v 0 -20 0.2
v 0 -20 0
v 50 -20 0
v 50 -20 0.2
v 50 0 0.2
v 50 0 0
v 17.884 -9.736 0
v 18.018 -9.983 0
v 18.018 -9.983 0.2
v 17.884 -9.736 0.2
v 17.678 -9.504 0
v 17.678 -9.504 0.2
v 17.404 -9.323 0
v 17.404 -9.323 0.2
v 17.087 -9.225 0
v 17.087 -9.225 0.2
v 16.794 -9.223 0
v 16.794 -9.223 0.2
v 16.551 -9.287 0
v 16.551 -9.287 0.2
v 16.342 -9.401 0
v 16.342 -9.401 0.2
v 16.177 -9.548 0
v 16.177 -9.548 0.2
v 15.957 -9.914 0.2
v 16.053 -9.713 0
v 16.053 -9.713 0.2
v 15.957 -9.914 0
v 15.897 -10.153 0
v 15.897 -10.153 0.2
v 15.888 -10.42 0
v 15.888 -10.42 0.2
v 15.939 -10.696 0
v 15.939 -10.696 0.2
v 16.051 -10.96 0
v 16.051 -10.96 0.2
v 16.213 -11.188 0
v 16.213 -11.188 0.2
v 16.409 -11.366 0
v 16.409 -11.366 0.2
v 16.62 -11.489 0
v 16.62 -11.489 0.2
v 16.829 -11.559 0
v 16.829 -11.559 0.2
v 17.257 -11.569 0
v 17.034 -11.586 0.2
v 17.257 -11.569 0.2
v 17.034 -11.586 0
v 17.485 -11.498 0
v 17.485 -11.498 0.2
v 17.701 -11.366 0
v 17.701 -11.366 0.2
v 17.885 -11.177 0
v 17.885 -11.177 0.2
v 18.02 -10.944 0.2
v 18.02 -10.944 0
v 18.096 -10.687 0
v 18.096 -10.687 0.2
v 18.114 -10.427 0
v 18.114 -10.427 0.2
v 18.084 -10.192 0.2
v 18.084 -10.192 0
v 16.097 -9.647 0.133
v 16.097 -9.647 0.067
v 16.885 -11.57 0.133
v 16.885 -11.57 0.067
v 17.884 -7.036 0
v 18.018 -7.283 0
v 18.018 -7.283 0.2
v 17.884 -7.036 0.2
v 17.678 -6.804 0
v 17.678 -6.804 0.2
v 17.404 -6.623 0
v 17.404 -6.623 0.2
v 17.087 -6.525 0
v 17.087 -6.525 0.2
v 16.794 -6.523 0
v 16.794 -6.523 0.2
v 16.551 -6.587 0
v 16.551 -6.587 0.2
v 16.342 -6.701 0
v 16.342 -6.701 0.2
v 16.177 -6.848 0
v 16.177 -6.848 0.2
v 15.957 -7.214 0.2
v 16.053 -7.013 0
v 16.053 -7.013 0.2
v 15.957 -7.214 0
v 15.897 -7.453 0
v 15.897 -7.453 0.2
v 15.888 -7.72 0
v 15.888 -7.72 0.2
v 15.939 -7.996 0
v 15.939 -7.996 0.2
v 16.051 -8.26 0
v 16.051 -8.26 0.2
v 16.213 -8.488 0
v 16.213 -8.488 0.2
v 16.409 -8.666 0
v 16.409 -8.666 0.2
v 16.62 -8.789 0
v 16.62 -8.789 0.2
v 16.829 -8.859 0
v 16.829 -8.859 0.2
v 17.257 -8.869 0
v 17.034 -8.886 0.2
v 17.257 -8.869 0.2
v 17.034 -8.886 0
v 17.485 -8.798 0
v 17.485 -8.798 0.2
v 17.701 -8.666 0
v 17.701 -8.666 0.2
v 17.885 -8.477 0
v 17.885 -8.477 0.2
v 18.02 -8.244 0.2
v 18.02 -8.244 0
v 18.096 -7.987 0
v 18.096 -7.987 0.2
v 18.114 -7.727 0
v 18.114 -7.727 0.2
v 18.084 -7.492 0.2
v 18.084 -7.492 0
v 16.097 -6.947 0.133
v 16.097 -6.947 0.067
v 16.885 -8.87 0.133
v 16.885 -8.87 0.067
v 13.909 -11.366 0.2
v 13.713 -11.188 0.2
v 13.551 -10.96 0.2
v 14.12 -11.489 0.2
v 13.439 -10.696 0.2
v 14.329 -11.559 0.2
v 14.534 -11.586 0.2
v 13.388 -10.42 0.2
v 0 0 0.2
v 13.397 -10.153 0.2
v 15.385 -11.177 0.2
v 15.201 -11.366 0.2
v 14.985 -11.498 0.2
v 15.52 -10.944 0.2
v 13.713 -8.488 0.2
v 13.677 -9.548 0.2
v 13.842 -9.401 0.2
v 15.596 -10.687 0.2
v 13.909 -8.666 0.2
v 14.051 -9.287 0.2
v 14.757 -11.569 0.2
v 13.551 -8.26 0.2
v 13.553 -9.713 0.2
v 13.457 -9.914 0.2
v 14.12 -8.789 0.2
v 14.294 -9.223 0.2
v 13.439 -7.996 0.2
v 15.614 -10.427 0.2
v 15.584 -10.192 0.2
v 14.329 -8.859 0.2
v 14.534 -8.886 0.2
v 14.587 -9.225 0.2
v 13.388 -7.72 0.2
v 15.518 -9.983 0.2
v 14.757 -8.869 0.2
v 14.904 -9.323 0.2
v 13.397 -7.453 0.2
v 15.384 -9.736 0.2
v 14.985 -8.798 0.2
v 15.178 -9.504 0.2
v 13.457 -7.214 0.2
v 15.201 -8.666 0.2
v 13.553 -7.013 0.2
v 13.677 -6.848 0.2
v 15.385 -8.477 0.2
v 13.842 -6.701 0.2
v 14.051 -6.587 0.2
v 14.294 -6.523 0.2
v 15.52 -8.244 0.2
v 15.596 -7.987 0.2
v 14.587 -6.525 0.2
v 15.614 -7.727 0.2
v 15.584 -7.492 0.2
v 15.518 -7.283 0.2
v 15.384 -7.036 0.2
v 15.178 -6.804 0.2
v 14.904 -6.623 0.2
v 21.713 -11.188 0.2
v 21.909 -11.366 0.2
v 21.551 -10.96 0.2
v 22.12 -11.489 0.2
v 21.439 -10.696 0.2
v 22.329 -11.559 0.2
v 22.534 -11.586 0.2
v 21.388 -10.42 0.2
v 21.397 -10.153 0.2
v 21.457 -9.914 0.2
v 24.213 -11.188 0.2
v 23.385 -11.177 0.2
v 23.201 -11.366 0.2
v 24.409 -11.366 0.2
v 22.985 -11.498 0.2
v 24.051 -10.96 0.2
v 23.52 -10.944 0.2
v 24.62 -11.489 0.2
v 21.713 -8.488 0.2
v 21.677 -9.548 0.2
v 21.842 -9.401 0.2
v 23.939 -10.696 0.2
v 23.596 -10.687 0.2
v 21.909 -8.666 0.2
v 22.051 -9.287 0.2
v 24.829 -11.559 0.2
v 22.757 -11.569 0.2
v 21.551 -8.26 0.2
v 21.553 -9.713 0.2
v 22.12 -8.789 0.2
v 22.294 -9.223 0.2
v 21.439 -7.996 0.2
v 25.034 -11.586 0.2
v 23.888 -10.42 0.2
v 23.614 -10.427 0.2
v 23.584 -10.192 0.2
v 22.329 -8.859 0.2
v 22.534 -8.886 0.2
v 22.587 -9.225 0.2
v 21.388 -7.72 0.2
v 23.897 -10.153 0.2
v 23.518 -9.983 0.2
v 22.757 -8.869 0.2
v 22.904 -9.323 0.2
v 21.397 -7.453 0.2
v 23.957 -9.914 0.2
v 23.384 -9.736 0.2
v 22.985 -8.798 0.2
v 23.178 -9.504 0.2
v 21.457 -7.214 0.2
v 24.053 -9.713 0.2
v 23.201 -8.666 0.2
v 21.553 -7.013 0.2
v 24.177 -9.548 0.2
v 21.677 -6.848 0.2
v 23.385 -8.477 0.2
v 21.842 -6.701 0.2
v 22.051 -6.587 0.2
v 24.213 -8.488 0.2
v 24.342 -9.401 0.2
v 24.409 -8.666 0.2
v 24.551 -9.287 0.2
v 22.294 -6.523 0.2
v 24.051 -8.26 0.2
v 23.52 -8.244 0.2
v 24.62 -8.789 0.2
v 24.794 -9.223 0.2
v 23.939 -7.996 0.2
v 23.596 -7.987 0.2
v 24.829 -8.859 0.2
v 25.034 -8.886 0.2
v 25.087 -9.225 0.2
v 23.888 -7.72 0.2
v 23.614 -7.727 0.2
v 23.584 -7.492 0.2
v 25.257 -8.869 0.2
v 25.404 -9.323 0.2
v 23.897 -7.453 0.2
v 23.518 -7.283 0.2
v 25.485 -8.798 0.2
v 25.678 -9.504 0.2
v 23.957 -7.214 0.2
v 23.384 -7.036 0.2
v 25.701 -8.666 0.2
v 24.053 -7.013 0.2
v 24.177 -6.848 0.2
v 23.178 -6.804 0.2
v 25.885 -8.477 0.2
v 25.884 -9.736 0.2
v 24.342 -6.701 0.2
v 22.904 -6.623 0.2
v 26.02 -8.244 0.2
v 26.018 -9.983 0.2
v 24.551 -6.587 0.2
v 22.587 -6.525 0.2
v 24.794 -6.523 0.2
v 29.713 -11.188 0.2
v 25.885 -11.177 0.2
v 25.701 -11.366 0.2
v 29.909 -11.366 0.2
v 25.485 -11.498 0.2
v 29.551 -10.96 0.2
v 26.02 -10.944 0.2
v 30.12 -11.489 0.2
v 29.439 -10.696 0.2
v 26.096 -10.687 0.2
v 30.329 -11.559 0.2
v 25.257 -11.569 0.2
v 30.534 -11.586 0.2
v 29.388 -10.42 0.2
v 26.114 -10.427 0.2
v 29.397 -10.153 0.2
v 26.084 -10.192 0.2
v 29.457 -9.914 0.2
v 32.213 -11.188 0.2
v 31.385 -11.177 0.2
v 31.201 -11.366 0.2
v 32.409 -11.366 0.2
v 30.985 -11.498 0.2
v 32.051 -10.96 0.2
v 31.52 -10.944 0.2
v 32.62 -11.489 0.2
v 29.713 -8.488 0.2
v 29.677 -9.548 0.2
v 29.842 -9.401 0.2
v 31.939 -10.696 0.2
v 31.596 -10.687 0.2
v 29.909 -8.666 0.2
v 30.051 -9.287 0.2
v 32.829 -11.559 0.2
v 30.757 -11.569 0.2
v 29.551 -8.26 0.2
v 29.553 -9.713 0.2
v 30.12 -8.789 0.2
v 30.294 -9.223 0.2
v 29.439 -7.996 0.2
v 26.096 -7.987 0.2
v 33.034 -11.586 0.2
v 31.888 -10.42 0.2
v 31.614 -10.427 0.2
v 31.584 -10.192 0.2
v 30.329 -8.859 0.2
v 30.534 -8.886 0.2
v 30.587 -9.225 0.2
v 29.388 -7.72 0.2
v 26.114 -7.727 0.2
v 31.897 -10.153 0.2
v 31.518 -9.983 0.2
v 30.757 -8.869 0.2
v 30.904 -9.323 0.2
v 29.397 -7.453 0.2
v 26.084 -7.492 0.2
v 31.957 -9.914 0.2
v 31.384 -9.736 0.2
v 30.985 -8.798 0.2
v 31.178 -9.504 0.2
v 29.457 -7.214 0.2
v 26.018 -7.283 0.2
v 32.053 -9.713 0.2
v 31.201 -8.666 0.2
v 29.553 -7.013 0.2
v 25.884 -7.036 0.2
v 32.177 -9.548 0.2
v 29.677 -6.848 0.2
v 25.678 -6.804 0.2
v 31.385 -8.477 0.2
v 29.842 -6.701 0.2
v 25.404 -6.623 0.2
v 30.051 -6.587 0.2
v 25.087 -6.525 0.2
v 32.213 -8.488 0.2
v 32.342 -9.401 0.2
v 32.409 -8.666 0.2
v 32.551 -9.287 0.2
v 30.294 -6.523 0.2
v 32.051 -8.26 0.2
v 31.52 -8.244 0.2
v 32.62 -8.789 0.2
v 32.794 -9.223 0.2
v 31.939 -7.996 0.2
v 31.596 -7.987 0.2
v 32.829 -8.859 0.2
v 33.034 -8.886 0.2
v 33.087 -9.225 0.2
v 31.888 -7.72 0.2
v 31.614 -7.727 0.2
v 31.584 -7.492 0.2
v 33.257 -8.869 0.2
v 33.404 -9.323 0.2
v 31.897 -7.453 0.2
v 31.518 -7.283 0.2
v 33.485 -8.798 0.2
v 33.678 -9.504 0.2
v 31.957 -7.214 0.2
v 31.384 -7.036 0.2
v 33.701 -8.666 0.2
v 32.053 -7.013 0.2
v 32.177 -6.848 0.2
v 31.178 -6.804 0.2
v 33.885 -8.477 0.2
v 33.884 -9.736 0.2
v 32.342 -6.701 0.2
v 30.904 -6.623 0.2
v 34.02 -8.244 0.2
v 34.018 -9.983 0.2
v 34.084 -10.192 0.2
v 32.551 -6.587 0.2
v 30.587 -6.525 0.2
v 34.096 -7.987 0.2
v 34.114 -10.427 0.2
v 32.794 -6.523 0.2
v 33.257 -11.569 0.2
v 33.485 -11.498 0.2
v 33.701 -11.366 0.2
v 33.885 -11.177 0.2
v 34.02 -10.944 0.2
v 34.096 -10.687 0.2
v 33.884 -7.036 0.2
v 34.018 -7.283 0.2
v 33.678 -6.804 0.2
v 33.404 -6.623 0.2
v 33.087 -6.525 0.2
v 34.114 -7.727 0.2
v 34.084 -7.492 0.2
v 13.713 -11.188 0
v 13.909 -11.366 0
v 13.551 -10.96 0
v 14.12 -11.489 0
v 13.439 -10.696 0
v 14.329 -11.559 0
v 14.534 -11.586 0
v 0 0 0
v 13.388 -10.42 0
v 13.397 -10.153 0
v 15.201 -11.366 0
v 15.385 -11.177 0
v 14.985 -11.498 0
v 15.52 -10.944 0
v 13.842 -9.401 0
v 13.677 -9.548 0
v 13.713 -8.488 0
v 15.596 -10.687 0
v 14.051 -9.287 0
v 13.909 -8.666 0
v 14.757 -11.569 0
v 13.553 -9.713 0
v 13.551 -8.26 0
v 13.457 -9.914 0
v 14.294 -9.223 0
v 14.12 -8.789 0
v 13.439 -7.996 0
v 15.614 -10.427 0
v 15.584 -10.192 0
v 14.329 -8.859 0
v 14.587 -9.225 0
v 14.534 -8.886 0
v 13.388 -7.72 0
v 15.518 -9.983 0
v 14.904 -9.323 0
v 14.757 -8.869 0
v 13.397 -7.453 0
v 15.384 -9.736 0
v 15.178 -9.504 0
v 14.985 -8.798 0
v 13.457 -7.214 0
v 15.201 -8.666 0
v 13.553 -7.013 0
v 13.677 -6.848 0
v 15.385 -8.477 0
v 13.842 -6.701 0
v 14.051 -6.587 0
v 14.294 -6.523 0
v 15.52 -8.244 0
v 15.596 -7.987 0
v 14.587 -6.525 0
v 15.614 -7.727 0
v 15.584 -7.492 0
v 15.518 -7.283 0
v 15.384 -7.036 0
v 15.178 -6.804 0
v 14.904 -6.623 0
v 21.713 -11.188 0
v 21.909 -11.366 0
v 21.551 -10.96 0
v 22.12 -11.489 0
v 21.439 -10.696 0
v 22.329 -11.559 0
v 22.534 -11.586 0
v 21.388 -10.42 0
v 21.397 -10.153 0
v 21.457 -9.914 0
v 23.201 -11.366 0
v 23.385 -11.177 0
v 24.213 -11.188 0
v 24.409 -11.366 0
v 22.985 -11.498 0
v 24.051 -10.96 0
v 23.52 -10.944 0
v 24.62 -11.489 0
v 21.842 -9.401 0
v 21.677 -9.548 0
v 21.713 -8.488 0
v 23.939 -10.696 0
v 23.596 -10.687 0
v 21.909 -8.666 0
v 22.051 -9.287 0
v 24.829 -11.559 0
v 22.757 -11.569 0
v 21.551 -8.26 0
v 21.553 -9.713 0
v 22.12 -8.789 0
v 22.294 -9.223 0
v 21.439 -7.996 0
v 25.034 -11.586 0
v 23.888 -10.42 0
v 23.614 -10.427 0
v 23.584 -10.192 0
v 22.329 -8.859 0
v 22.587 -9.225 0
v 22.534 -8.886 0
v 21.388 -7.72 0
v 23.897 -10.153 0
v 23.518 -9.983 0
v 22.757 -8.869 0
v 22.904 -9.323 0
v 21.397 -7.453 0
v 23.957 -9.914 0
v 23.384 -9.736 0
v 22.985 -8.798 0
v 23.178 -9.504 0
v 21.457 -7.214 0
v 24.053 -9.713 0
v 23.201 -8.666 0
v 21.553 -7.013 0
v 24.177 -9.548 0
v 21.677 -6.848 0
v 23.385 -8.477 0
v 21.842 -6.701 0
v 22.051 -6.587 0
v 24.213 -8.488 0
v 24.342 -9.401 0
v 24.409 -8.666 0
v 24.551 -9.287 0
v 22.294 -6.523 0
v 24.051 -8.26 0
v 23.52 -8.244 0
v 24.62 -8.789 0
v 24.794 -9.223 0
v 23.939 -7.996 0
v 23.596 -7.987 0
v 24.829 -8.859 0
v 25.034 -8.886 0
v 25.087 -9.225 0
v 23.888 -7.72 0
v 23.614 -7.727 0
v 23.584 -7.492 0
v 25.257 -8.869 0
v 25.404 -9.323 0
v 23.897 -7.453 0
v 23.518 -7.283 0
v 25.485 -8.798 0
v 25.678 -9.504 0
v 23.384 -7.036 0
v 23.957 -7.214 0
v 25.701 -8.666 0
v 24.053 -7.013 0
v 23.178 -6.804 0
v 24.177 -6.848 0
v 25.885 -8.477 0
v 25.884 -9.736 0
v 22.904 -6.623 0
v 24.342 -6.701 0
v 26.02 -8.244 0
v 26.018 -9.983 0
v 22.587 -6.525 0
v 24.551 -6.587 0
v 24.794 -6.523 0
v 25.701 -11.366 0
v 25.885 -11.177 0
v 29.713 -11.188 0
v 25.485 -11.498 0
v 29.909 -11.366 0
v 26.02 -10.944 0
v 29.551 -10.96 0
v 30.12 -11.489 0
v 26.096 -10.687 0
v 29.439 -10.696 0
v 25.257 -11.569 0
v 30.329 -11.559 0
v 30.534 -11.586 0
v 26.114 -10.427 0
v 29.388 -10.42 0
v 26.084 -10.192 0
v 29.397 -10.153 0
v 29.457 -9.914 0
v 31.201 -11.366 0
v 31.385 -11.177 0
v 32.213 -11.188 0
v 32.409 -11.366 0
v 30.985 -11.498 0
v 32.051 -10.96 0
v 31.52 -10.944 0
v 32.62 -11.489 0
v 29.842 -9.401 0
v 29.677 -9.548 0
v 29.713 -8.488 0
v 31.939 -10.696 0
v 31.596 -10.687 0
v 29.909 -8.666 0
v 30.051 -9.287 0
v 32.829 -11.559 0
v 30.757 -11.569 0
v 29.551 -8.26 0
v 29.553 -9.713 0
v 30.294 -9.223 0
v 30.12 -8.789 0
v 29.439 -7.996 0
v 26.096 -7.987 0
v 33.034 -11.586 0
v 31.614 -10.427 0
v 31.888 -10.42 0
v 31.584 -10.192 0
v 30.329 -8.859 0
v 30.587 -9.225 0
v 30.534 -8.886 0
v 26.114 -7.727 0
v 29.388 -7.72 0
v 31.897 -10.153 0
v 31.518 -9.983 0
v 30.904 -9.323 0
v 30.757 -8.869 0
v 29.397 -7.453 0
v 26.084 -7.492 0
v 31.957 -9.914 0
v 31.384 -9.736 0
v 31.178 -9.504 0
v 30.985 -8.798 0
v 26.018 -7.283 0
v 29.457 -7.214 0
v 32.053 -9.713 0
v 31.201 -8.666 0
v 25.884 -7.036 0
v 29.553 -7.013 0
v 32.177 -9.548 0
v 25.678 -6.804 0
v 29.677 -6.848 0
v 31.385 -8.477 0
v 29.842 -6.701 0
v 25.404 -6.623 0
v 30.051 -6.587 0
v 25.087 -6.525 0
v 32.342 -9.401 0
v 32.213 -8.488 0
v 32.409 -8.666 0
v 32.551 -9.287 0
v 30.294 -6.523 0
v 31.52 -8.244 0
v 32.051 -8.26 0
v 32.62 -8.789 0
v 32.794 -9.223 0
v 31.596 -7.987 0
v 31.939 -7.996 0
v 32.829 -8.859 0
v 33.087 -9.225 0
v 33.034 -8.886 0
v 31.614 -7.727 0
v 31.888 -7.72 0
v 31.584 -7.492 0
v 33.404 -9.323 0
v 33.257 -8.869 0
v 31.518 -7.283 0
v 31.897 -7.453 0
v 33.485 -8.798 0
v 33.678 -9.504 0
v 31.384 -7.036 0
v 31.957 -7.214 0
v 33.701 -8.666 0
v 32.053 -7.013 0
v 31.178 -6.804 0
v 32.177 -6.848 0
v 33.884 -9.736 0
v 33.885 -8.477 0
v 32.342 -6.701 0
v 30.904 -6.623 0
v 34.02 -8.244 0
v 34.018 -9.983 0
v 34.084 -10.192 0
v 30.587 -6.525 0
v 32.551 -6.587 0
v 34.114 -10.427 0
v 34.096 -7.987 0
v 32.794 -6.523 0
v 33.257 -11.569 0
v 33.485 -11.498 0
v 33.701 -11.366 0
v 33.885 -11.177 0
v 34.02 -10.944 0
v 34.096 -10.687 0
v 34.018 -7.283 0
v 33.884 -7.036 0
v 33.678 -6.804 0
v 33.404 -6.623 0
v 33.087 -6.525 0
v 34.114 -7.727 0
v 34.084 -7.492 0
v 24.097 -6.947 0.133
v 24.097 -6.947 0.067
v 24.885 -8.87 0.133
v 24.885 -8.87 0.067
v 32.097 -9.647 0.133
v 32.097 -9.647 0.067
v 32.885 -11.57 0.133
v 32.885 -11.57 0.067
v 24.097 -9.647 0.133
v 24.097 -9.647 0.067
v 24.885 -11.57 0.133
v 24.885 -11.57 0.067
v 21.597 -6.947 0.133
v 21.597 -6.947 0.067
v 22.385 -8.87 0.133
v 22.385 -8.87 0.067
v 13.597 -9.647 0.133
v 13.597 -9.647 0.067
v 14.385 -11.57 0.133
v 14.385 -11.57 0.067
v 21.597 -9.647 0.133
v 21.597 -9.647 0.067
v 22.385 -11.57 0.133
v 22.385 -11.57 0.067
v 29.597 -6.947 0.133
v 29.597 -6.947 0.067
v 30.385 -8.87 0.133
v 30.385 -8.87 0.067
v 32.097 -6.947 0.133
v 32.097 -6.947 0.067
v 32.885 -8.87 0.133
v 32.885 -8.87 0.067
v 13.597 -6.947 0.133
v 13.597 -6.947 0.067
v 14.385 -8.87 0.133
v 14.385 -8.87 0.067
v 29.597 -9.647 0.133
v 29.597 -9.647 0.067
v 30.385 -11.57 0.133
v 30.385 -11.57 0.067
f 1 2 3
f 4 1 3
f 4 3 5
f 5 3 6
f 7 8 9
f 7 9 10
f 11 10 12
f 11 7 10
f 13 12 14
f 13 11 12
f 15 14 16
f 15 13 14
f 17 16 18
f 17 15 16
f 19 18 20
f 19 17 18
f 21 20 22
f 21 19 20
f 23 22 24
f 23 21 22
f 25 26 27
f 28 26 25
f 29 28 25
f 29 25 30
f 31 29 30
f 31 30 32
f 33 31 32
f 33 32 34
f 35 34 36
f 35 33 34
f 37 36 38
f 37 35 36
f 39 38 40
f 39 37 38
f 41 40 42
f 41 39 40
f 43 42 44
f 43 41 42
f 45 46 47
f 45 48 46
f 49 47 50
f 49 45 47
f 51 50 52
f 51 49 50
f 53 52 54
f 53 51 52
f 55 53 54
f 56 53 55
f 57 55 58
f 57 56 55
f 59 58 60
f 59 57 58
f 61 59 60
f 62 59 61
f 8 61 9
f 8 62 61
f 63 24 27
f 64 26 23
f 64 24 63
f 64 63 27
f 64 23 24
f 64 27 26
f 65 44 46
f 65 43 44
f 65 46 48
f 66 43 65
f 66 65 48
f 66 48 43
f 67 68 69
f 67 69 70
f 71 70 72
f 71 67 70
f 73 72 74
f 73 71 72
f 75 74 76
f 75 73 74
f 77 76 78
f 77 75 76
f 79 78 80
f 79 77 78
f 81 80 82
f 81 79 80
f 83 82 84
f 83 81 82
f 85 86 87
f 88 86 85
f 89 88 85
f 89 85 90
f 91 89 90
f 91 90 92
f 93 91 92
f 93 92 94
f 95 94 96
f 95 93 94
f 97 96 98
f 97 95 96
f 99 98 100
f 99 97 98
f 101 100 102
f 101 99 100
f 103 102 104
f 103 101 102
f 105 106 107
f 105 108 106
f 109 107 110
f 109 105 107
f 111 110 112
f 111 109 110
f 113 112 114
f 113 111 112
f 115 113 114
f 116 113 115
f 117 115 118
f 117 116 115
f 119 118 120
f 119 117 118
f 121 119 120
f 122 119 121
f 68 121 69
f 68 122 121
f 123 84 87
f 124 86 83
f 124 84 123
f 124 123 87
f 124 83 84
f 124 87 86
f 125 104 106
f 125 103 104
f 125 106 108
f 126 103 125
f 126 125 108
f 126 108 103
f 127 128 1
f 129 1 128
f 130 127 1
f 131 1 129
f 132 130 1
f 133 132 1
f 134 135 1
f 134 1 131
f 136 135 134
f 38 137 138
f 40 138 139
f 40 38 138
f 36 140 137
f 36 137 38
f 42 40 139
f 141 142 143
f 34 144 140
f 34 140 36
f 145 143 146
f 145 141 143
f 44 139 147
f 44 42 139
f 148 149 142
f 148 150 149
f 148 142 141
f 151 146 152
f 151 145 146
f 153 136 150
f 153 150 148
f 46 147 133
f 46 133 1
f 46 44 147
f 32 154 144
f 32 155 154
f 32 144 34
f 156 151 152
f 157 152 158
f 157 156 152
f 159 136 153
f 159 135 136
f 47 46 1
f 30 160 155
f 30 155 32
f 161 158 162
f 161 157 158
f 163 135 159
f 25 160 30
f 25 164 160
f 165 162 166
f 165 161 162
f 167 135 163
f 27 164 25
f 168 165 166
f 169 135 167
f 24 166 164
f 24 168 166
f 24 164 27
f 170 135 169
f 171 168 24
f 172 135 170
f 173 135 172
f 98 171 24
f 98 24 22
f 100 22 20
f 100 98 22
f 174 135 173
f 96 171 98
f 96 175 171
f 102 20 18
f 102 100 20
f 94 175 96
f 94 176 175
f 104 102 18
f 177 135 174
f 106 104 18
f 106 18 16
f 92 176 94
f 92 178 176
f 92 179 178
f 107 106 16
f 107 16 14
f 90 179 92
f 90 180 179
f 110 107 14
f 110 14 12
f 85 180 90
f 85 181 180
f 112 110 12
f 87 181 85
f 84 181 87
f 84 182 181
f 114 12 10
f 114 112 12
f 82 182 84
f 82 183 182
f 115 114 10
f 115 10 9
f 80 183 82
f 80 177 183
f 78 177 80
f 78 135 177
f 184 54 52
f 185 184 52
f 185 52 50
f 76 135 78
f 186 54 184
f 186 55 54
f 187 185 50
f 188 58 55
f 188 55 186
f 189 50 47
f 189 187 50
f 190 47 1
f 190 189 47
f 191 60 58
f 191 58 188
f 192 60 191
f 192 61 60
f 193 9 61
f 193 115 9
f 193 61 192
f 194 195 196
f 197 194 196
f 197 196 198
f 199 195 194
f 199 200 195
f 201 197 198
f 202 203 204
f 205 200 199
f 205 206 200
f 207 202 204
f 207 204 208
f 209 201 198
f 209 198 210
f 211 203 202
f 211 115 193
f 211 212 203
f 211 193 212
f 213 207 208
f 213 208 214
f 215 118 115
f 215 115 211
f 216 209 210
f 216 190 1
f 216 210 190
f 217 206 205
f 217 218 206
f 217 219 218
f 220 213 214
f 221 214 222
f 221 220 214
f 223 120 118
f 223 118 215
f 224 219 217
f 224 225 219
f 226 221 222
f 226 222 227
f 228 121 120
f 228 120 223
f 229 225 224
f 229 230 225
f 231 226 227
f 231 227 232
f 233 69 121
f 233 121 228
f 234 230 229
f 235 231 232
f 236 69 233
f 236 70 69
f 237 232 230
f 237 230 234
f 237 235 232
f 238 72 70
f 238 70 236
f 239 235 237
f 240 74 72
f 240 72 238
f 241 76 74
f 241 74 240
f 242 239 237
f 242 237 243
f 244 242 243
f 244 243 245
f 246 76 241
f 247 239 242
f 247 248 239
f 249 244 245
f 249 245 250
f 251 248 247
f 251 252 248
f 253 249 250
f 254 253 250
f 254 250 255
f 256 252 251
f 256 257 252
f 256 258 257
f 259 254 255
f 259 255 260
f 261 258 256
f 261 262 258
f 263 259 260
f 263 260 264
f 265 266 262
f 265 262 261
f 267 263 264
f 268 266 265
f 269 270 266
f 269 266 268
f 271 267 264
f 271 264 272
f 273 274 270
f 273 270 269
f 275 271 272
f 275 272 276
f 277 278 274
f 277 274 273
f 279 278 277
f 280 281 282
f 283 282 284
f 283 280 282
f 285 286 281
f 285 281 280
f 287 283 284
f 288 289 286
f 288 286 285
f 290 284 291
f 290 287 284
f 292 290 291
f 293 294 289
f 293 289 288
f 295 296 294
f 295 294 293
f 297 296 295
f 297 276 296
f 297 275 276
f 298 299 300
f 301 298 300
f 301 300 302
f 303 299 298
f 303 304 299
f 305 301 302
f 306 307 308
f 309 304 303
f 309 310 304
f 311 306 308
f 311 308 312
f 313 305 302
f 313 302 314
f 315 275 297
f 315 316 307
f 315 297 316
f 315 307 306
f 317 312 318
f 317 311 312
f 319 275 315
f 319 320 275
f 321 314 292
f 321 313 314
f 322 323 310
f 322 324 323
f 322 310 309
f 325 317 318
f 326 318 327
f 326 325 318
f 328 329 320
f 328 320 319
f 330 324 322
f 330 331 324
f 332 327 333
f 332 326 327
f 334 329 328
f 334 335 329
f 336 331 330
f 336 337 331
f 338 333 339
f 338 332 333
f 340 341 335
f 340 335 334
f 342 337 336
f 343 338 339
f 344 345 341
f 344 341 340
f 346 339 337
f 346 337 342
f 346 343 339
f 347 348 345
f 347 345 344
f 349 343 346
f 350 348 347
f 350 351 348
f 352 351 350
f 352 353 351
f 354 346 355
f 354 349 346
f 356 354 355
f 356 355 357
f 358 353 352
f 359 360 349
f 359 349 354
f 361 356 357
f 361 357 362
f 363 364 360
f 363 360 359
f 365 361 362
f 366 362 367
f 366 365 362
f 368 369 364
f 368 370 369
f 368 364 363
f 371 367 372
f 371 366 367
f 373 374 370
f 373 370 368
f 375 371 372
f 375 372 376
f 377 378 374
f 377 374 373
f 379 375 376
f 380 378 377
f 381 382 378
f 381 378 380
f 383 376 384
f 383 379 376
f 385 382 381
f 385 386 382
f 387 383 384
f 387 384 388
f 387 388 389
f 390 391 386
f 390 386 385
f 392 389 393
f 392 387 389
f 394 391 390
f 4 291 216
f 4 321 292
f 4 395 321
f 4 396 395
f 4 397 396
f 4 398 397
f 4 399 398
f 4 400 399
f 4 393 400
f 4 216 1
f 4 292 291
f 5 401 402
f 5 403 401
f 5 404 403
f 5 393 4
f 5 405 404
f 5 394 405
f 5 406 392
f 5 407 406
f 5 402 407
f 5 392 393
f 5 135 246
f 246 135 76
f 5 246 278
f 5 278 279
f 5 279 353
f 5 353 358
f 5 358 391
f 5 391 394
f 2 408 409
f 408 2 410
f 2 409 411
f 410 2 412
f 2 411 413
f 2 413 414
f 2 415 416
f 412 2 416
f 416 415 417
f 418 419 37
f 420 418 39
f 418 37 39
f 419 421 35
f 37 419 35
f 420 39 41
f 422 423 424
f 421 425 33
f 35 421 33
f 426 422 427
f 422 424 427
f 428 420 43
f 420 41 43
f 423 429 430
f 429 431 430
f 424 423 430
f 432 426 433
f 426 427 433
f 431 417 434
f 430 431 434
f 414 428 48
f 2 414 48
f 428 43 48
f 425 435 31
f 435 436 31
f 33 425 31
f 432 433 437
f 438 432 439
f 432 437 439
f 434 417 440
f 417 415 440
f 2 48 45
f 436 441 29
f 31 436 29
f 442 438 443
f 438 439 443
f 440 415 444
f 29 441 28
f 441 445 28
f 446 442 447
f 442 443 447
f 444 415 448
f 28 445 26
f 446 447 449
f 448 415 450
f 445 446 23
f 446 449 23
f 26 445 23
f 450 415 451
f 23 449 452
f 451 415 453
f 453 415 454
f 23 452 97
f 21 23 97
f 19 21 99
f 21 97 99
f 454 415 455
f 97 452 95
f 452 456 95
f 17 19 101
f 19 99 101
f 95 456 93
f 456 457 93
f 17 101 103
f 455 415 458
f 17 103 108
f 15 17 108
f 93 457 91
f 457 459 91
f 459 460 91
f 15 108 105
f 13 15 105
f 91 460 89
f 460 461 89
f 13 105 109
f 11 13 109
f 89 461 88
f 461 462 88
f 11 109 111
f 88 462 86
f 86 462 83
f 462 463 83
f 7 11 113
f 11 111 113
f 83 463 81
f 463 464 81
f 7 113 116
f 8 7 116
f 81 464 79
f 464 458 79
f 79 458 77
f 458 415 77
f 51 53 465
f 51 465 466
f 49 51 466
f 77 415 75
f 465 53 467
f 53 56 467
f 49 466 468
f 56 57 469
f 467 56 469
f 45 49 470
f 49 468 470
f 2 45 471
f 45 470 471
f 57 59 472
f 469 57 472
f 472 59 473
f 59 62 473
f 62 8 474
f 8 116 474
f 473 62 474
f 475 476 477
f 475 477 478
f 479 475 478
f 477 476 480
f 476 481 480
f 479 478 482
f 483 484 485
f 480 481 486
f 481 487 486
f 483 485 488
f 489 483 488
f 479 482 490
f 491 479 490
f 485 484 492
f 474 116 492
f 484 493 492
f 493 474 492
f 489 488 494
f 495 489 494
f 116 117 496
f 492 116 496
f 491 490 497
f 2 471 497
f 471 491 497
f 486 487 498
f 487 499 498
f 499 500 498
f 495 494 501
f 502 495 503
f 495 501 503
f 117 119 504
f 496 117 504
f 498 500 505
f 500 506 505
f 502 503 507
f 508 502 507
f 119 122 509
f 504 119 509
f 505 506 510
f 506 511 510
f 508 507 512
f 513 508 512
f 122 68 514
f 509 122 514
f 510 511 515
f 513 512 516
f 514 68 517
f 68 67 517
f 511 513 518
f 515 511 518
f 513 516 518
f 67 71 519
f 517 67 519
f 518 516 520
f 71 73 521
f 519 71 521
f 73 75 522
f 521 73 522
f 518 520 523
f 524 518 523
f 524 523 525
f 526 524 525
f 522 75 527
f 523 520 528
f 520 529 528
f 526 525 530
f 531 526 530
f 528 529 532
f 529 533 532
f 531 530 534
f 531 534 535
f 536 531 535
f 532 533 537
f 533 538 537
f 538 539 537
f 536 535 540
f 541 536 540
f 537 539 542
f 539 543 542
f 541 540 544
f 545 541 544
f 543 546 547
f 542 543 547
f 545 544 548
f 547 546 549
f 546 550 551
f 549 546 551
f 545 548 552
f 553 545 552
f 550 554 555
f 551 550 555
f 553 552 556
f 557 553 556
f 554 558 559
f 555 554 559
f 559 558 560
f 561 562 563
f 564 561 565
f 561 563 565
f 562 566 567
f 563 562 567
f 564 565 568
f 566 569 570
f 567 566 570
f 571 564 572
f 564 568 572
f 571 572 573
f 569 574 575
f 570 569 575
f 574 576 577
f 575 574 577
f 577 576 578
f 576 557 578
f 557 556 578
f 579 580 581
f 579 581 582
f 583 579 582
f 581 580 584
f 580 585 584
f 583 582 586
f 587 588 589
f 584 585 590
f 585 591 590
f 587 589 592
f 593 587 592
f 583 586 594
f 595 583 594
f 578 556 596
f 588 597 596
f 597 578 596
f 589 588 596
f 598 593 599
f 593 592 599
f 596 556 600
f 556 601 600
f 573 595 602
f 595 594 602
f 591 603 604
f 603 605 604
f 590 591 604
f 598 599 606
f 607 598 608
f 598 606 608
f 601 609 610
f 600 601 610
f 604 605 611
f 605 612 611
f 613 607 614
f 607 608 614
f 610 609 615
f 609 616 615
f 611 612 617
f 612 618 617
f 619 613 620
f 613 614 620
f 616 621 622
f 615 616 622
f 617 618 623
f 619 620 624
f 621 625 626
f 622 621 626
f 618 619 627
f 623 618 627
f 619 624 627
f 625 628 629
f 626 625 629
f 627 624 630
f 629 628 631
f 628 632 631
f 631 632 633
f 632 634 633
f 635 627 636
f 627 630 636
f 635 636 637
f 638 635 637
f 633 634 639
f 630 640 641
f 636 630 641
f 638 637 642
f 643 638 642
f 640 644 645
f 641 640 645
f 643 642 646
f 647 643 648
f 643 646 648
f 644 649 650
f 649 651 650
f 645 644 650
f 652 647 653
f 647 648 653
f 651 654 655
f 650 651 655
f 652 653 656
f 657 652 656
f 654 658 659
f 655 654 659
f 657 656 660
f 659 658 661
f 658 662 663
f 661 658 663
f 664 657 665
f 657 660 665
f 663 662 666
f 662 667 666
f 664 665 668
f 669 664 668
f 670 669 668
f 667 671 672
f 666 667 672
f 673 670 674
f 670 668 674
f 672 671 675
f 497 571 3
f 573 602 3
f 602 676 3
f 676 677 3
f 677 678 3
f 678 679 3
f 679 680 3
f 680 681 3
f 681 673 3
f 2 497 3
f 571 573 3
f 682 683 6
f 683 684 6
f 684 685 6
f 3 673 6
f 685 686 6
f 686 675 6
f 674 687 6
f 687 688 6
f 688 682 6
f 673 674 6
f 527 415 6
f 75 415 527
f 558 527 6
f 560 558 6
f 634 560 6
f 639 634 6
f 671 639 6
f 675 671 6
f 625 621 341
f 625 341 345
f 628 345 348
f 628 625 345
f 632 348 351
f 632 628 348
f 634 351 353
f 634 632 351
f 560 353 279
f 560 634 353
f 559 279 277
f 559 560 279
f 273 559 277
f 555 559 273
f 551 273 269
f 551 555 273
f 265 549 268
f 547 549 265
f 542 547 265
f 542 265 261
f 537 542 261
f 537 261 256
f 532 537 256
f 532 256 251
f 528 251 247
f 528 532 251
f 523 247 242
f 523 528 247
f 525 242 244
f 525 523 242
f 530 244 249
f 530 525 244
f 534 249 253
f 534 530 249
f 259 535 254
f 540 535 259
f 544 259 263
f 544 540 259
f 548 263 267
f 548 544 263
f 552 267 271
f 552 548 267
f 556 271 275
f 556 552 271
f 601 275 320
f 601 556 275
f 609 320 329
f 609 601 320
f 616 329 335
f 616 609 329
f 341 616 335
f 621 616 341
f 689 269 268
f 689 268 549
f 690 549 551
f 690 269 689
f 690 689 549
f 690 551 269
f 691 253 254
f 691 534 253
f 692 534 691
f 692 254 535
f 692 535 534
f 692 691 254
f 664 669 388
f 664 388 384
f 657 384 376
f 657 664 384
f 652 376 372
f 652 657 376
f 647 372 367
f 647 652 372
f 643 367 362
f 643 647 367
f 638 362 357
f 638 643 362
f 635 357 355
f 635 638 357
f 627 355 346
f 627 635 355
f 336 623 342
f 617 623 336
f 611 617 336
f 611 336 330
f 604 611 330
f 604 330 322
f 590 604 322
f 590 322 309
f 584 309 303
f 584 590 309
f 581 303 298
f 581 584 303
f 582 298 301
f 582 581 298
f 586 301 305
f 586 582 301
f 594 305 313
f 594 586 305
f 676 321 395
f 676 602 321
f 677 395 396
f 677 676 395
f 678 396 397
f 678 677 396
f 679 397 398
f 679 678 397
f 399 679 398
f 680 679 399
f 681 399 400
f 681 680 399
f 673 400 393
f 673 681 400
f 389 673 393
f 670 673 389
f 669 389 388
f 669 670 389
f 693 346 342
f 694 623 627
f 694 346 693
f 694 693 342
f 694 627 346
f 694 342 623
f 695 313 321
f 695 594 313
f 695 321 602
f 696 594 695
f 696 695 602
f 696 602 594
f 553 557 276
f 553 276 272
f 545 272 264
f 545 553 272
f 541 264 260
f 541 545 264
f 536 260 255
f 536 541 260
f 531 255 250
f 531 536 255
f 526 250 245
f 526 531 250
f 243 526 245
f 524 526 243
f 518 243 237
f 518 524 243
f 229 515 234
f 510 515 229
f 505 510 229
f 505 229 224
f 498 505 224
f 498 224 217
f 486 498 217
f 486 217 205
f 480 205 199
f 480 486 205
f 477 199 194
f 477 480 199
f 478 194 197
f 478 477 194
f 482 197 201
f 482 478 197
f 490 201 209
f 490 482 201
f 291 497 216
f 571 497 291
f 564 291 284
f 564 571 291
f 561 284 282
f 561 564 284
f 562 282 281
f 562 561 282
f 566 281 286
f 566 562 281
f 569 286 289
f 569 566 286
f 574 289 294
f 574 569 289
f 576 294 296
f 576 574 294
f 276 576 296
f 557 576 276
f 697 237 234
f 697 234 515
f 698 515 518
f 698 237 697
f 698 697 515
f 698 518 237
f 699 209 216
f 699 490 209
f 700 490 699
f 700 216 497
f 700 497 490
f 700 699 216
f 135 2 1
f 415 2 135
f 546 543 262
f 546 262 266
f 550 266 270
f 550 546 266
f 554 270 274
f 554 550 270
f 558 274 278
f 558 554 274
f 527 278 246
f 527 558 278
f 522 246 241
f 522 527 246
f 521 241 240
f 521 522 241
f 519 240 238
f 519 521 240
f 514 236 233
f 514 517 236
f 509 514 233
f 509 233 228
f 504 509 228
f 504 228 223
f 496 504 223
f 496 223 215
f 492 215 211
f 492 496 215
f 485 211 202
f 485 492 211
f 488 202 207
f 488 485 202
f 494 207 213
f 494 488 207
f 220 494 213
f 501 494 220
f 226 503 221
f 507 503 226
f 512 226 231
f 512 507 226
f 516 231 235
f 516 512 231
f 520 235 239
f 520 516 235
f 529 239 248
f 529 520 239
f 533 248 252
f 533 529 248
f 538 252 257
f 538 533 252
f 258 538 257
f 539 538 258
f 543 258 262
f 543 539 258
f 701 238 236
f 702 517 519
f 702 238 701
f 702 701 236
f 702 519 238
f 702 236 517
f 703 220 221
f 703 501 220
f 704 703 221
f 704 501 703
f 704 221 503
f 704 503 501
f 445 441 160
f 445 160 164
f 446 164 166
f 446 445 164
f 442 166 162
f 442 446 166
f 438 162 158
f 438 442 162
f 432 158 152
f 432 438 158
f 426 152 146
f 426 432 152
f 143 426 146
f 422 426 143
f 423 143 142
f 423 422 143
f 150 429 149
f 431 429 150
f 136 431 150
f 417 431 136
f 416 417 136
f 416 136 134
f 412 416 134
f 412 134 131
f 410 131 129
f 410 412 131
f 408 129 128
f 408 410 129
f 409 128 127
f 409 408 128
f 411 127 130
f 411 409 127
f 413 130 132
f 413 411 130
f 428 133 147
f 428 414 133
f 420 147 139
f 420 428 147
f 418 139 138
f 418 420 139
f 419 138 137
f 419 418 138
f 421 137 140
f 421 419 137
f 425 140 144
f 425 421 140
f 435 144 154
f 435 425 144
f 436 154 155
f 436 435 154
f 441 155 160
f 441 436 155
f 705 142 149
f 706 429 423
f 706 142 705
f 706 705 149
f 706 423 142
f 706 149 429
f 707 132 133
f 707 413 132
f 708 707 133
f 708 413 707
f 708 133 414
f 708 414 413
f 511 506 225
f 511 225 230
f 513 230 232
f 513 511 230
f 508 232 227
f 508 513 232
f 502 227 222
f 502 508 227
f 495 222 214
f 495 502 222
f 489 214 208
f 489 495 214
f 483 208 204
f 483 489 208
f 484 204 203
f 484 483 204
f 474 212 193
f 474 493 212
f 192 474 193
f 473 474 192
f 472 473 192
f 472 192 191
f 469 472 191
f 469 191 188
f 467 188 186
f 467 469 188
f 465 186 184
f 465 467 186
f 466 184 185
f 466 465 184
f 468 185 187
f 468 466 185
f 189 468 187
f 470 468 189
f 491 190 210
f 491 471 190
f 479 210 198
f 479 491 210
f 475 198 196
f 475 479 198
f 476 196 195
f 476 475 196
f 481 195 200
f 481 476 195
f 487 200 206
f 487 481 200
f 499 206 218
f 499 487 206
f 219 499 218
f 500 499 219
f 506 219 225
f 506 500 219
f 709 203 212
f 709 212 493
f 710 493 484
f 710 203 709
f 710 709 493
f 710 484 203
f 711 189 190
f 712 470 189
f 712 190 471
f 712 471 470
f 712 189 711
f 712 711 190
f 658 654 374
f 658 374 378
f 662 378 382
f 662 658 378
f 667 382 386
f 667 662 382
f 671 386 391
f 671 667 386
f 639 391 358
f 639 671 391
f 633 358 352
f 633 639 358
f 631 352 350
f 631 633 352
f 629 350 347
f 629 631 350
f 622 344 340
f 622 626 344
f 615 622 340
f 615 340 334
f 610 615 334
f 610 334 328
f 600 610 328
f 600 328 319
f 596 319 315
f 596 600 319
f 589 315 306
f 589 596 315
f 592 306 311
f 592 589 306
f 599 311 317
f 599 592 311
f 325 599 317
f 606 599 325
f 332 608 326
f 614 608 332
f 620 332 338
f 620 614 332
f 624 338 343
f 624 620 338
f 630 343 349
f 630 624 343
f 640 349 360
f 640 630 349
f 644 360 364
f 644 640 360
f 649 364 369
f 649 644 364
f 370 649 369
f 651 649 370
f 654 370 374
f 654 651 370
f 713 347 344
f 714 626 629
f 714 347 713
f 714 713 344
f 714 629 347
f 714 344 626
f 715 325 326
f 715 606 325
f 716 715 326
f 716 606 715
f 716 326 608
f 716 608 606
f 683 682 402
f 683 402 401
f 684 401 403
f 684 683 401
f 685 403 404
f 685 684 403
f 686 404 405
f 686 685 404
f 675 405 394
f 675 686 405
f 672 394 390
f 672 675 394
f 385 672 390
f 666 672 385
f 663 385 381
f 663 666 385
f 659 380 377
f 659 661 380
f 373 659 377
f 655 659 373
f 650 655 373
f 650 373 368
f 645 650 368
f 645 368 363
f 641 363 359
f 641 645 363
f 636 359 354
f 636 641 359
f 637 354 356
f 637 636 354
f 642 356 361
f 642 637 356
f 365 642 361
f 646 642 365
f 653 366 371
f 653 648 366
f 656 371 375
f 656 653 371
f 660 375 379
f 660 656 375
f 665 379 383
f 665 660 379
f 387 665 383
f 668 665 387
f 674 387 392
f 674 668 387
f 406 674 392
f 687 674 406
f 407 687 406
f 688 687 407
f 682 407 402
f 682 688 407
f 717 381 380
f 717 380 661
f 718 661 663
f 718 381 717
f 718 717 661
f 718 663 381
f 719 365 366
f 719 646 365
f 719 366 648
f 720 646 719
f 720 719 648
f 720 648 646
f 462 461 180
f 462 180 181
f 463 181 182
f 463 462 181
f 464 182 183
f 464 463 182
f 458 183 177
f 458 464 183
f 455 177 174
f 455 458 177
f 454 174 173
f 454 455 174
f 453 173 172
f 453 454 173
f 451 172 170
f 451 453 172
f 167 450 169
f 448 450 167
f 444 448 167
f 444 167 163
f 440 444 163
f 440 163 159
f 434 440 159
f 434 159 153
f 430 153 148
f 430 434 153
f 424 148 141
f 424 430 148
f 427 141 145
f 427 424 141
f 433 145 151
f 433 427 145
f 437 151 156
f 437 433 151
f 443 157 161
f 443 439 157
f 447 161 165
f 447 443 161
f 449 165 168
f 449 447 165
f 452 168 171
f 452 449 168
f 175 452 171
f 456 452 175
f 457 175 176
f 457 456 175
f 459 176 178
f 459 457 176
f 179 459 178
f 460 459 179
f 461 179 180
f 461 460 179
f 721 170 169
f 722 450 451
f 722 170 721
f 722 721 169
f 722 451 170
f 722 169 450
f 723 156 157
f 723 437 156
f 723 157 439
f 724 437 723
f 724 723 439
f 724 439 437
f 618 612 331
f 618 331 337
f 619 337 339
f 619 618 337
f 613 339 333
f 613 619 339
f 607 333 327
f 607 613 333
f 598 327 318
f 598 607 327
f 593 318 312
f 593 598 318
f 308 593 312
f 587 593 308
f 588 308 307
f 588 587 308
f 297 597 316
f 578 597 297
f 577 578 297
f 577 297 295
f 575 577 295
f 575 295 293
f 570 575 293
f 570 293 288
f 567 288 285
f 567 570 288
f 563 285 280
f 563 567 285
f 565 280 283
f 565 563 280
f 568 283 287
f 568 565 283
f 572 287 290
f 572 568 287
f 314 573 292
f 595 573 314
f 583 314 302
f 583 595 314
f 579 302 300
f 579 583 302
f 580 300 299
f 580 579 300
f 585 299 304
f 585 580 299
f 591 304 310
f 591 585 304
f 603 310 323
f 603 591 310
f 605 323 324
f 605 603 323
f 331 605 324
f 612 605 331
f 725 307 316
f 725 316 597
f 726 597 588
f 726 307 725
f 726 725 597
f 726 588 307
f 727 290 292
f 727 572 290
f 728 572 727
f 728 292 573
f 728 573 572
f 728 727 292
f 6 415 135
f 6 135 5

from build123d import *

# Parameters (mm, degrees)
F0_W     = 50
F0_H     = 20
F1_DEPTH = 0.2


with BuildPart() as f1:
    # F0 (on Top) → F1 (new body)
    with BuildSketch(Plane.XY):
        with Locations((25, -10)):
            Rectangle(F0_W, F0_H)
        with BuildLine():
            add(Edge.make_bspline(
                [(15.517839, -9.982863), (14.729655, -8.059646), (13.596988, -9.64696), (12.464321, -11.234274), (14.385173, -11.570177), (16.306024, -11.906081), (15.517839, -9.982863)],
                knots=[4.712389, 4.712389, 4.712389, 6.806784, 6.806784, 8.901179, 8.901179, 10.995574, 10.995574, 10.995574], degree=2, weights=[1, 0.5, 1, 0.5, 1, 0.5, 1]))
        make_face(mode=Mode.SUBTRACT)
        with BuildLine():
            add(Edge.make_bspline(
                [(18.017839, -9.982863), (17.229655, -8.059646), (16.096988, -9.64696), (14.964321, -11.234274), (16.885173, -11.570177), (18.806024, -11.906081), (18.017839, -9.982863)],
                knots=[4.712389, 4.712389, 4.712389, 6.806784, 6.806784, 8.901179, 8.901179, 10.995574, 10.995574, 10.995574], degree=2, weights=[1, 0.5, 1, 0.5, 1, 0.5, 1]))
        make_face(mode=Mode.SUBTRACT)
        with BuildLine():
            add(Edge.make_bspline(
                [(23.517839, -9.982863), (22.729655, -8.059646), (21.596988, -9.64696), (20.464321, -11.234274), (22.385173, -11.570177), (24.306024, -11.906081), (23.517839, -9.982863)],
                knots=[4.712389, 4.712389, 4.712389, 6.806784, 6.806784, 8.901179, 8.901179, 10.995574, 10.995574, 10.995574], degree=2, weights=[1, 0.5, 1, 0.5, 1, 0.5, 1]))
        make_face(mode=Mode.SUBTRACT)
        with BuildLine():
            add(Edge.make_bspline(
                [(26.017839, -9.982863), (25.229655, -8.059646), (24.096988, -9.64696), (22.964321, -11.234274), (24.885173, -11.570177), (26.806024, -11.906081), (26.017839, -9.982863)],
                knots=[4.712389, 4.712389, 4.712389, 6.806784, 6.806784, 8.901179, 8.901179, 10.995574, 10.995574, 10.995574], degree=2, weights=[1, 0.5, 1, 0.5, 1, 0.5, 1]))
        make_face(mode=Mode.SUBTRACT)
        with BuildLine():
            add(Edge.make_bspline(
                [(31.517839, -9.982863), (30.729655, -8.059646), (29.596988, -9.64696), (28.464321, -11.234274), (30.385173, -11.570177), (32.306024, -11.906081), (31.517839, -9.982863)],
                knots=[4.712389, 4.712389, 4.712389, 6.806784, 6.806784, 8.901179, 8.901179, 10.995574, 10.995574, 10.995574], degree=2, weights=[1, 0.5, 1, 0.5, 1, 0.5, 1]))
        make_face(mode=Mode.SUBTRACT)
        with BuildLine():
            add(Edge.make_bspline(
                [(34.017839, -9.982863), (33.229655, -8.059646), (32.096988, -9.64696), (30.964321, -11.234274), (32.885173, -11.570177), (34.806024, -11.906081), (34.017839, -9.982863)],
                knots=[4.712389, 4.712389, 4.712389, 6.806784, 6.806784, 8.901179, 8.901179, 10.995574, 10.995574, 10.995574], degree=2, weights=[1, 0.5, 1, 0.5, 1, 0.5, 1]))
        make_face(mode=Mode.SUBTRACT)
        with BuildLine():
            add(Edge.make_bspline(
                [(15.517839, -7.282863), (14.729655, -5.359646), (13.596988, -6.94696), (12.464321, -8.534274), (14.385173, -8.870177), (16.306024, -9.206081), (15.517839, -7.282863)],
                knots=[4.712389, 4.712389, 4.712389, 6.806784, 6.806784, 8.901179, 8.901179, 10.995574, 10.995574, 10.995574], degree=2, weights=[1, 0.5, 1, 0.5, 1, 0.5, 1]))
        make_face(mode=Mode.SUBTRACT)
        with BuildLine():
            add(Edge.make_bspline(
                [(18.017839, -7.282863), (17.229655, -5.359646), (16.096988, -6.94696), (14.964321, -8.534274), (16.885173, -8.870177), (18.806024, -9.206081), (18.017839, -7.282863)],
                knots=[4.712389, 4.712389, 4.712389, 6.806784, 6.806784, 8.901179, 8.901179, 10.995574, 10.995574, 10.995574], degree=2, weights=[1, 0.5, 1, 0.5, 1, 0.5, 1]))
        make_face(mode=Mode.SUBTRACT)
        with BuildLine():
            add(Edge.make_bspline(
                [(23.517839, -7.282863), (22.729655, -5.359646), (21.596988, -6.94696), (20.464321, -8.534274), (22.385173, -8.870177), (24.306024, -9.206081), (23.517839, -7.282863)],
                knots=[4.712389, 4.712389, 4.712389, 6.806784, 6.806784, 8.901179, 8.901179, 10.995574, 10.995574, 10.995574], degree=2, weights=[1, 0.5, 1, 0.5, 1, 0.5, 1]))
        make_face(mode=Mode.SUBTRACT)
        with BuildLine():
            add(Edge.make_bspline(
                [(26.017839, -7.282863), (25.229655, -5.359646), (24.096988, -6.94696), (22.964321, -8.534274), (24.885173, -8.870177), (26.806024, -9.206081), (26.017839, -7.282863)],
                knots=[4.712389, 4.712389, 4.712389, 6.806784, 6.806784, 8.901179, 8.901179, 10.995574, 10.995574, 10.995574], degree=2, weights=[1, 0.5, 1, 0.5, 1, 0.5, 1]))
        make_face(mode=Mode.SUBTRACT)
        with BuildLine():
            add(Edge.make_bspline(
                [(31.517839, -7.282863), (30.729655, -5.359646), (29.596988, -6.94696), (28.464321, -8.534274), (30.385173, -8.870177), (32.306024, -9.206081), (31.517839, -7.282863)],
                knots=[4.712389, 4.712389, 4.712389, 6.806784, 6.806784, 8.901179, 8.901179, 10.995574, 10.995574, 10.995574], degree=2, weights=[1, 0.5, 1, 0.5, 1, 0.5, 1]))
        make_face(mode=Mode.SUBTRACT)
        with BuildLine():
            add(Edge.make_bspline(
                [(34.017839, -7.282863), (33.229655, -5.359646), (32.096988, -6.94696), (30.964321, -8.534274), (32.885173, -8.870177), (34.806024, -9.206081), (34.017839, -7.282863)],
                knots=[4.712389, 4.712389, 4.712389, 6.806784, 6.806784, 8.901179, 8.901179, 10.995574, 10.995574, 10.995574], degree=2, weights=[1, 0.5, 1, 0.5, 1, 0.5, 1]))
        make_face(mode=Mode.SUBTRACT)
    extrude(amount=F1_DEPTH)


solid = f1.part
